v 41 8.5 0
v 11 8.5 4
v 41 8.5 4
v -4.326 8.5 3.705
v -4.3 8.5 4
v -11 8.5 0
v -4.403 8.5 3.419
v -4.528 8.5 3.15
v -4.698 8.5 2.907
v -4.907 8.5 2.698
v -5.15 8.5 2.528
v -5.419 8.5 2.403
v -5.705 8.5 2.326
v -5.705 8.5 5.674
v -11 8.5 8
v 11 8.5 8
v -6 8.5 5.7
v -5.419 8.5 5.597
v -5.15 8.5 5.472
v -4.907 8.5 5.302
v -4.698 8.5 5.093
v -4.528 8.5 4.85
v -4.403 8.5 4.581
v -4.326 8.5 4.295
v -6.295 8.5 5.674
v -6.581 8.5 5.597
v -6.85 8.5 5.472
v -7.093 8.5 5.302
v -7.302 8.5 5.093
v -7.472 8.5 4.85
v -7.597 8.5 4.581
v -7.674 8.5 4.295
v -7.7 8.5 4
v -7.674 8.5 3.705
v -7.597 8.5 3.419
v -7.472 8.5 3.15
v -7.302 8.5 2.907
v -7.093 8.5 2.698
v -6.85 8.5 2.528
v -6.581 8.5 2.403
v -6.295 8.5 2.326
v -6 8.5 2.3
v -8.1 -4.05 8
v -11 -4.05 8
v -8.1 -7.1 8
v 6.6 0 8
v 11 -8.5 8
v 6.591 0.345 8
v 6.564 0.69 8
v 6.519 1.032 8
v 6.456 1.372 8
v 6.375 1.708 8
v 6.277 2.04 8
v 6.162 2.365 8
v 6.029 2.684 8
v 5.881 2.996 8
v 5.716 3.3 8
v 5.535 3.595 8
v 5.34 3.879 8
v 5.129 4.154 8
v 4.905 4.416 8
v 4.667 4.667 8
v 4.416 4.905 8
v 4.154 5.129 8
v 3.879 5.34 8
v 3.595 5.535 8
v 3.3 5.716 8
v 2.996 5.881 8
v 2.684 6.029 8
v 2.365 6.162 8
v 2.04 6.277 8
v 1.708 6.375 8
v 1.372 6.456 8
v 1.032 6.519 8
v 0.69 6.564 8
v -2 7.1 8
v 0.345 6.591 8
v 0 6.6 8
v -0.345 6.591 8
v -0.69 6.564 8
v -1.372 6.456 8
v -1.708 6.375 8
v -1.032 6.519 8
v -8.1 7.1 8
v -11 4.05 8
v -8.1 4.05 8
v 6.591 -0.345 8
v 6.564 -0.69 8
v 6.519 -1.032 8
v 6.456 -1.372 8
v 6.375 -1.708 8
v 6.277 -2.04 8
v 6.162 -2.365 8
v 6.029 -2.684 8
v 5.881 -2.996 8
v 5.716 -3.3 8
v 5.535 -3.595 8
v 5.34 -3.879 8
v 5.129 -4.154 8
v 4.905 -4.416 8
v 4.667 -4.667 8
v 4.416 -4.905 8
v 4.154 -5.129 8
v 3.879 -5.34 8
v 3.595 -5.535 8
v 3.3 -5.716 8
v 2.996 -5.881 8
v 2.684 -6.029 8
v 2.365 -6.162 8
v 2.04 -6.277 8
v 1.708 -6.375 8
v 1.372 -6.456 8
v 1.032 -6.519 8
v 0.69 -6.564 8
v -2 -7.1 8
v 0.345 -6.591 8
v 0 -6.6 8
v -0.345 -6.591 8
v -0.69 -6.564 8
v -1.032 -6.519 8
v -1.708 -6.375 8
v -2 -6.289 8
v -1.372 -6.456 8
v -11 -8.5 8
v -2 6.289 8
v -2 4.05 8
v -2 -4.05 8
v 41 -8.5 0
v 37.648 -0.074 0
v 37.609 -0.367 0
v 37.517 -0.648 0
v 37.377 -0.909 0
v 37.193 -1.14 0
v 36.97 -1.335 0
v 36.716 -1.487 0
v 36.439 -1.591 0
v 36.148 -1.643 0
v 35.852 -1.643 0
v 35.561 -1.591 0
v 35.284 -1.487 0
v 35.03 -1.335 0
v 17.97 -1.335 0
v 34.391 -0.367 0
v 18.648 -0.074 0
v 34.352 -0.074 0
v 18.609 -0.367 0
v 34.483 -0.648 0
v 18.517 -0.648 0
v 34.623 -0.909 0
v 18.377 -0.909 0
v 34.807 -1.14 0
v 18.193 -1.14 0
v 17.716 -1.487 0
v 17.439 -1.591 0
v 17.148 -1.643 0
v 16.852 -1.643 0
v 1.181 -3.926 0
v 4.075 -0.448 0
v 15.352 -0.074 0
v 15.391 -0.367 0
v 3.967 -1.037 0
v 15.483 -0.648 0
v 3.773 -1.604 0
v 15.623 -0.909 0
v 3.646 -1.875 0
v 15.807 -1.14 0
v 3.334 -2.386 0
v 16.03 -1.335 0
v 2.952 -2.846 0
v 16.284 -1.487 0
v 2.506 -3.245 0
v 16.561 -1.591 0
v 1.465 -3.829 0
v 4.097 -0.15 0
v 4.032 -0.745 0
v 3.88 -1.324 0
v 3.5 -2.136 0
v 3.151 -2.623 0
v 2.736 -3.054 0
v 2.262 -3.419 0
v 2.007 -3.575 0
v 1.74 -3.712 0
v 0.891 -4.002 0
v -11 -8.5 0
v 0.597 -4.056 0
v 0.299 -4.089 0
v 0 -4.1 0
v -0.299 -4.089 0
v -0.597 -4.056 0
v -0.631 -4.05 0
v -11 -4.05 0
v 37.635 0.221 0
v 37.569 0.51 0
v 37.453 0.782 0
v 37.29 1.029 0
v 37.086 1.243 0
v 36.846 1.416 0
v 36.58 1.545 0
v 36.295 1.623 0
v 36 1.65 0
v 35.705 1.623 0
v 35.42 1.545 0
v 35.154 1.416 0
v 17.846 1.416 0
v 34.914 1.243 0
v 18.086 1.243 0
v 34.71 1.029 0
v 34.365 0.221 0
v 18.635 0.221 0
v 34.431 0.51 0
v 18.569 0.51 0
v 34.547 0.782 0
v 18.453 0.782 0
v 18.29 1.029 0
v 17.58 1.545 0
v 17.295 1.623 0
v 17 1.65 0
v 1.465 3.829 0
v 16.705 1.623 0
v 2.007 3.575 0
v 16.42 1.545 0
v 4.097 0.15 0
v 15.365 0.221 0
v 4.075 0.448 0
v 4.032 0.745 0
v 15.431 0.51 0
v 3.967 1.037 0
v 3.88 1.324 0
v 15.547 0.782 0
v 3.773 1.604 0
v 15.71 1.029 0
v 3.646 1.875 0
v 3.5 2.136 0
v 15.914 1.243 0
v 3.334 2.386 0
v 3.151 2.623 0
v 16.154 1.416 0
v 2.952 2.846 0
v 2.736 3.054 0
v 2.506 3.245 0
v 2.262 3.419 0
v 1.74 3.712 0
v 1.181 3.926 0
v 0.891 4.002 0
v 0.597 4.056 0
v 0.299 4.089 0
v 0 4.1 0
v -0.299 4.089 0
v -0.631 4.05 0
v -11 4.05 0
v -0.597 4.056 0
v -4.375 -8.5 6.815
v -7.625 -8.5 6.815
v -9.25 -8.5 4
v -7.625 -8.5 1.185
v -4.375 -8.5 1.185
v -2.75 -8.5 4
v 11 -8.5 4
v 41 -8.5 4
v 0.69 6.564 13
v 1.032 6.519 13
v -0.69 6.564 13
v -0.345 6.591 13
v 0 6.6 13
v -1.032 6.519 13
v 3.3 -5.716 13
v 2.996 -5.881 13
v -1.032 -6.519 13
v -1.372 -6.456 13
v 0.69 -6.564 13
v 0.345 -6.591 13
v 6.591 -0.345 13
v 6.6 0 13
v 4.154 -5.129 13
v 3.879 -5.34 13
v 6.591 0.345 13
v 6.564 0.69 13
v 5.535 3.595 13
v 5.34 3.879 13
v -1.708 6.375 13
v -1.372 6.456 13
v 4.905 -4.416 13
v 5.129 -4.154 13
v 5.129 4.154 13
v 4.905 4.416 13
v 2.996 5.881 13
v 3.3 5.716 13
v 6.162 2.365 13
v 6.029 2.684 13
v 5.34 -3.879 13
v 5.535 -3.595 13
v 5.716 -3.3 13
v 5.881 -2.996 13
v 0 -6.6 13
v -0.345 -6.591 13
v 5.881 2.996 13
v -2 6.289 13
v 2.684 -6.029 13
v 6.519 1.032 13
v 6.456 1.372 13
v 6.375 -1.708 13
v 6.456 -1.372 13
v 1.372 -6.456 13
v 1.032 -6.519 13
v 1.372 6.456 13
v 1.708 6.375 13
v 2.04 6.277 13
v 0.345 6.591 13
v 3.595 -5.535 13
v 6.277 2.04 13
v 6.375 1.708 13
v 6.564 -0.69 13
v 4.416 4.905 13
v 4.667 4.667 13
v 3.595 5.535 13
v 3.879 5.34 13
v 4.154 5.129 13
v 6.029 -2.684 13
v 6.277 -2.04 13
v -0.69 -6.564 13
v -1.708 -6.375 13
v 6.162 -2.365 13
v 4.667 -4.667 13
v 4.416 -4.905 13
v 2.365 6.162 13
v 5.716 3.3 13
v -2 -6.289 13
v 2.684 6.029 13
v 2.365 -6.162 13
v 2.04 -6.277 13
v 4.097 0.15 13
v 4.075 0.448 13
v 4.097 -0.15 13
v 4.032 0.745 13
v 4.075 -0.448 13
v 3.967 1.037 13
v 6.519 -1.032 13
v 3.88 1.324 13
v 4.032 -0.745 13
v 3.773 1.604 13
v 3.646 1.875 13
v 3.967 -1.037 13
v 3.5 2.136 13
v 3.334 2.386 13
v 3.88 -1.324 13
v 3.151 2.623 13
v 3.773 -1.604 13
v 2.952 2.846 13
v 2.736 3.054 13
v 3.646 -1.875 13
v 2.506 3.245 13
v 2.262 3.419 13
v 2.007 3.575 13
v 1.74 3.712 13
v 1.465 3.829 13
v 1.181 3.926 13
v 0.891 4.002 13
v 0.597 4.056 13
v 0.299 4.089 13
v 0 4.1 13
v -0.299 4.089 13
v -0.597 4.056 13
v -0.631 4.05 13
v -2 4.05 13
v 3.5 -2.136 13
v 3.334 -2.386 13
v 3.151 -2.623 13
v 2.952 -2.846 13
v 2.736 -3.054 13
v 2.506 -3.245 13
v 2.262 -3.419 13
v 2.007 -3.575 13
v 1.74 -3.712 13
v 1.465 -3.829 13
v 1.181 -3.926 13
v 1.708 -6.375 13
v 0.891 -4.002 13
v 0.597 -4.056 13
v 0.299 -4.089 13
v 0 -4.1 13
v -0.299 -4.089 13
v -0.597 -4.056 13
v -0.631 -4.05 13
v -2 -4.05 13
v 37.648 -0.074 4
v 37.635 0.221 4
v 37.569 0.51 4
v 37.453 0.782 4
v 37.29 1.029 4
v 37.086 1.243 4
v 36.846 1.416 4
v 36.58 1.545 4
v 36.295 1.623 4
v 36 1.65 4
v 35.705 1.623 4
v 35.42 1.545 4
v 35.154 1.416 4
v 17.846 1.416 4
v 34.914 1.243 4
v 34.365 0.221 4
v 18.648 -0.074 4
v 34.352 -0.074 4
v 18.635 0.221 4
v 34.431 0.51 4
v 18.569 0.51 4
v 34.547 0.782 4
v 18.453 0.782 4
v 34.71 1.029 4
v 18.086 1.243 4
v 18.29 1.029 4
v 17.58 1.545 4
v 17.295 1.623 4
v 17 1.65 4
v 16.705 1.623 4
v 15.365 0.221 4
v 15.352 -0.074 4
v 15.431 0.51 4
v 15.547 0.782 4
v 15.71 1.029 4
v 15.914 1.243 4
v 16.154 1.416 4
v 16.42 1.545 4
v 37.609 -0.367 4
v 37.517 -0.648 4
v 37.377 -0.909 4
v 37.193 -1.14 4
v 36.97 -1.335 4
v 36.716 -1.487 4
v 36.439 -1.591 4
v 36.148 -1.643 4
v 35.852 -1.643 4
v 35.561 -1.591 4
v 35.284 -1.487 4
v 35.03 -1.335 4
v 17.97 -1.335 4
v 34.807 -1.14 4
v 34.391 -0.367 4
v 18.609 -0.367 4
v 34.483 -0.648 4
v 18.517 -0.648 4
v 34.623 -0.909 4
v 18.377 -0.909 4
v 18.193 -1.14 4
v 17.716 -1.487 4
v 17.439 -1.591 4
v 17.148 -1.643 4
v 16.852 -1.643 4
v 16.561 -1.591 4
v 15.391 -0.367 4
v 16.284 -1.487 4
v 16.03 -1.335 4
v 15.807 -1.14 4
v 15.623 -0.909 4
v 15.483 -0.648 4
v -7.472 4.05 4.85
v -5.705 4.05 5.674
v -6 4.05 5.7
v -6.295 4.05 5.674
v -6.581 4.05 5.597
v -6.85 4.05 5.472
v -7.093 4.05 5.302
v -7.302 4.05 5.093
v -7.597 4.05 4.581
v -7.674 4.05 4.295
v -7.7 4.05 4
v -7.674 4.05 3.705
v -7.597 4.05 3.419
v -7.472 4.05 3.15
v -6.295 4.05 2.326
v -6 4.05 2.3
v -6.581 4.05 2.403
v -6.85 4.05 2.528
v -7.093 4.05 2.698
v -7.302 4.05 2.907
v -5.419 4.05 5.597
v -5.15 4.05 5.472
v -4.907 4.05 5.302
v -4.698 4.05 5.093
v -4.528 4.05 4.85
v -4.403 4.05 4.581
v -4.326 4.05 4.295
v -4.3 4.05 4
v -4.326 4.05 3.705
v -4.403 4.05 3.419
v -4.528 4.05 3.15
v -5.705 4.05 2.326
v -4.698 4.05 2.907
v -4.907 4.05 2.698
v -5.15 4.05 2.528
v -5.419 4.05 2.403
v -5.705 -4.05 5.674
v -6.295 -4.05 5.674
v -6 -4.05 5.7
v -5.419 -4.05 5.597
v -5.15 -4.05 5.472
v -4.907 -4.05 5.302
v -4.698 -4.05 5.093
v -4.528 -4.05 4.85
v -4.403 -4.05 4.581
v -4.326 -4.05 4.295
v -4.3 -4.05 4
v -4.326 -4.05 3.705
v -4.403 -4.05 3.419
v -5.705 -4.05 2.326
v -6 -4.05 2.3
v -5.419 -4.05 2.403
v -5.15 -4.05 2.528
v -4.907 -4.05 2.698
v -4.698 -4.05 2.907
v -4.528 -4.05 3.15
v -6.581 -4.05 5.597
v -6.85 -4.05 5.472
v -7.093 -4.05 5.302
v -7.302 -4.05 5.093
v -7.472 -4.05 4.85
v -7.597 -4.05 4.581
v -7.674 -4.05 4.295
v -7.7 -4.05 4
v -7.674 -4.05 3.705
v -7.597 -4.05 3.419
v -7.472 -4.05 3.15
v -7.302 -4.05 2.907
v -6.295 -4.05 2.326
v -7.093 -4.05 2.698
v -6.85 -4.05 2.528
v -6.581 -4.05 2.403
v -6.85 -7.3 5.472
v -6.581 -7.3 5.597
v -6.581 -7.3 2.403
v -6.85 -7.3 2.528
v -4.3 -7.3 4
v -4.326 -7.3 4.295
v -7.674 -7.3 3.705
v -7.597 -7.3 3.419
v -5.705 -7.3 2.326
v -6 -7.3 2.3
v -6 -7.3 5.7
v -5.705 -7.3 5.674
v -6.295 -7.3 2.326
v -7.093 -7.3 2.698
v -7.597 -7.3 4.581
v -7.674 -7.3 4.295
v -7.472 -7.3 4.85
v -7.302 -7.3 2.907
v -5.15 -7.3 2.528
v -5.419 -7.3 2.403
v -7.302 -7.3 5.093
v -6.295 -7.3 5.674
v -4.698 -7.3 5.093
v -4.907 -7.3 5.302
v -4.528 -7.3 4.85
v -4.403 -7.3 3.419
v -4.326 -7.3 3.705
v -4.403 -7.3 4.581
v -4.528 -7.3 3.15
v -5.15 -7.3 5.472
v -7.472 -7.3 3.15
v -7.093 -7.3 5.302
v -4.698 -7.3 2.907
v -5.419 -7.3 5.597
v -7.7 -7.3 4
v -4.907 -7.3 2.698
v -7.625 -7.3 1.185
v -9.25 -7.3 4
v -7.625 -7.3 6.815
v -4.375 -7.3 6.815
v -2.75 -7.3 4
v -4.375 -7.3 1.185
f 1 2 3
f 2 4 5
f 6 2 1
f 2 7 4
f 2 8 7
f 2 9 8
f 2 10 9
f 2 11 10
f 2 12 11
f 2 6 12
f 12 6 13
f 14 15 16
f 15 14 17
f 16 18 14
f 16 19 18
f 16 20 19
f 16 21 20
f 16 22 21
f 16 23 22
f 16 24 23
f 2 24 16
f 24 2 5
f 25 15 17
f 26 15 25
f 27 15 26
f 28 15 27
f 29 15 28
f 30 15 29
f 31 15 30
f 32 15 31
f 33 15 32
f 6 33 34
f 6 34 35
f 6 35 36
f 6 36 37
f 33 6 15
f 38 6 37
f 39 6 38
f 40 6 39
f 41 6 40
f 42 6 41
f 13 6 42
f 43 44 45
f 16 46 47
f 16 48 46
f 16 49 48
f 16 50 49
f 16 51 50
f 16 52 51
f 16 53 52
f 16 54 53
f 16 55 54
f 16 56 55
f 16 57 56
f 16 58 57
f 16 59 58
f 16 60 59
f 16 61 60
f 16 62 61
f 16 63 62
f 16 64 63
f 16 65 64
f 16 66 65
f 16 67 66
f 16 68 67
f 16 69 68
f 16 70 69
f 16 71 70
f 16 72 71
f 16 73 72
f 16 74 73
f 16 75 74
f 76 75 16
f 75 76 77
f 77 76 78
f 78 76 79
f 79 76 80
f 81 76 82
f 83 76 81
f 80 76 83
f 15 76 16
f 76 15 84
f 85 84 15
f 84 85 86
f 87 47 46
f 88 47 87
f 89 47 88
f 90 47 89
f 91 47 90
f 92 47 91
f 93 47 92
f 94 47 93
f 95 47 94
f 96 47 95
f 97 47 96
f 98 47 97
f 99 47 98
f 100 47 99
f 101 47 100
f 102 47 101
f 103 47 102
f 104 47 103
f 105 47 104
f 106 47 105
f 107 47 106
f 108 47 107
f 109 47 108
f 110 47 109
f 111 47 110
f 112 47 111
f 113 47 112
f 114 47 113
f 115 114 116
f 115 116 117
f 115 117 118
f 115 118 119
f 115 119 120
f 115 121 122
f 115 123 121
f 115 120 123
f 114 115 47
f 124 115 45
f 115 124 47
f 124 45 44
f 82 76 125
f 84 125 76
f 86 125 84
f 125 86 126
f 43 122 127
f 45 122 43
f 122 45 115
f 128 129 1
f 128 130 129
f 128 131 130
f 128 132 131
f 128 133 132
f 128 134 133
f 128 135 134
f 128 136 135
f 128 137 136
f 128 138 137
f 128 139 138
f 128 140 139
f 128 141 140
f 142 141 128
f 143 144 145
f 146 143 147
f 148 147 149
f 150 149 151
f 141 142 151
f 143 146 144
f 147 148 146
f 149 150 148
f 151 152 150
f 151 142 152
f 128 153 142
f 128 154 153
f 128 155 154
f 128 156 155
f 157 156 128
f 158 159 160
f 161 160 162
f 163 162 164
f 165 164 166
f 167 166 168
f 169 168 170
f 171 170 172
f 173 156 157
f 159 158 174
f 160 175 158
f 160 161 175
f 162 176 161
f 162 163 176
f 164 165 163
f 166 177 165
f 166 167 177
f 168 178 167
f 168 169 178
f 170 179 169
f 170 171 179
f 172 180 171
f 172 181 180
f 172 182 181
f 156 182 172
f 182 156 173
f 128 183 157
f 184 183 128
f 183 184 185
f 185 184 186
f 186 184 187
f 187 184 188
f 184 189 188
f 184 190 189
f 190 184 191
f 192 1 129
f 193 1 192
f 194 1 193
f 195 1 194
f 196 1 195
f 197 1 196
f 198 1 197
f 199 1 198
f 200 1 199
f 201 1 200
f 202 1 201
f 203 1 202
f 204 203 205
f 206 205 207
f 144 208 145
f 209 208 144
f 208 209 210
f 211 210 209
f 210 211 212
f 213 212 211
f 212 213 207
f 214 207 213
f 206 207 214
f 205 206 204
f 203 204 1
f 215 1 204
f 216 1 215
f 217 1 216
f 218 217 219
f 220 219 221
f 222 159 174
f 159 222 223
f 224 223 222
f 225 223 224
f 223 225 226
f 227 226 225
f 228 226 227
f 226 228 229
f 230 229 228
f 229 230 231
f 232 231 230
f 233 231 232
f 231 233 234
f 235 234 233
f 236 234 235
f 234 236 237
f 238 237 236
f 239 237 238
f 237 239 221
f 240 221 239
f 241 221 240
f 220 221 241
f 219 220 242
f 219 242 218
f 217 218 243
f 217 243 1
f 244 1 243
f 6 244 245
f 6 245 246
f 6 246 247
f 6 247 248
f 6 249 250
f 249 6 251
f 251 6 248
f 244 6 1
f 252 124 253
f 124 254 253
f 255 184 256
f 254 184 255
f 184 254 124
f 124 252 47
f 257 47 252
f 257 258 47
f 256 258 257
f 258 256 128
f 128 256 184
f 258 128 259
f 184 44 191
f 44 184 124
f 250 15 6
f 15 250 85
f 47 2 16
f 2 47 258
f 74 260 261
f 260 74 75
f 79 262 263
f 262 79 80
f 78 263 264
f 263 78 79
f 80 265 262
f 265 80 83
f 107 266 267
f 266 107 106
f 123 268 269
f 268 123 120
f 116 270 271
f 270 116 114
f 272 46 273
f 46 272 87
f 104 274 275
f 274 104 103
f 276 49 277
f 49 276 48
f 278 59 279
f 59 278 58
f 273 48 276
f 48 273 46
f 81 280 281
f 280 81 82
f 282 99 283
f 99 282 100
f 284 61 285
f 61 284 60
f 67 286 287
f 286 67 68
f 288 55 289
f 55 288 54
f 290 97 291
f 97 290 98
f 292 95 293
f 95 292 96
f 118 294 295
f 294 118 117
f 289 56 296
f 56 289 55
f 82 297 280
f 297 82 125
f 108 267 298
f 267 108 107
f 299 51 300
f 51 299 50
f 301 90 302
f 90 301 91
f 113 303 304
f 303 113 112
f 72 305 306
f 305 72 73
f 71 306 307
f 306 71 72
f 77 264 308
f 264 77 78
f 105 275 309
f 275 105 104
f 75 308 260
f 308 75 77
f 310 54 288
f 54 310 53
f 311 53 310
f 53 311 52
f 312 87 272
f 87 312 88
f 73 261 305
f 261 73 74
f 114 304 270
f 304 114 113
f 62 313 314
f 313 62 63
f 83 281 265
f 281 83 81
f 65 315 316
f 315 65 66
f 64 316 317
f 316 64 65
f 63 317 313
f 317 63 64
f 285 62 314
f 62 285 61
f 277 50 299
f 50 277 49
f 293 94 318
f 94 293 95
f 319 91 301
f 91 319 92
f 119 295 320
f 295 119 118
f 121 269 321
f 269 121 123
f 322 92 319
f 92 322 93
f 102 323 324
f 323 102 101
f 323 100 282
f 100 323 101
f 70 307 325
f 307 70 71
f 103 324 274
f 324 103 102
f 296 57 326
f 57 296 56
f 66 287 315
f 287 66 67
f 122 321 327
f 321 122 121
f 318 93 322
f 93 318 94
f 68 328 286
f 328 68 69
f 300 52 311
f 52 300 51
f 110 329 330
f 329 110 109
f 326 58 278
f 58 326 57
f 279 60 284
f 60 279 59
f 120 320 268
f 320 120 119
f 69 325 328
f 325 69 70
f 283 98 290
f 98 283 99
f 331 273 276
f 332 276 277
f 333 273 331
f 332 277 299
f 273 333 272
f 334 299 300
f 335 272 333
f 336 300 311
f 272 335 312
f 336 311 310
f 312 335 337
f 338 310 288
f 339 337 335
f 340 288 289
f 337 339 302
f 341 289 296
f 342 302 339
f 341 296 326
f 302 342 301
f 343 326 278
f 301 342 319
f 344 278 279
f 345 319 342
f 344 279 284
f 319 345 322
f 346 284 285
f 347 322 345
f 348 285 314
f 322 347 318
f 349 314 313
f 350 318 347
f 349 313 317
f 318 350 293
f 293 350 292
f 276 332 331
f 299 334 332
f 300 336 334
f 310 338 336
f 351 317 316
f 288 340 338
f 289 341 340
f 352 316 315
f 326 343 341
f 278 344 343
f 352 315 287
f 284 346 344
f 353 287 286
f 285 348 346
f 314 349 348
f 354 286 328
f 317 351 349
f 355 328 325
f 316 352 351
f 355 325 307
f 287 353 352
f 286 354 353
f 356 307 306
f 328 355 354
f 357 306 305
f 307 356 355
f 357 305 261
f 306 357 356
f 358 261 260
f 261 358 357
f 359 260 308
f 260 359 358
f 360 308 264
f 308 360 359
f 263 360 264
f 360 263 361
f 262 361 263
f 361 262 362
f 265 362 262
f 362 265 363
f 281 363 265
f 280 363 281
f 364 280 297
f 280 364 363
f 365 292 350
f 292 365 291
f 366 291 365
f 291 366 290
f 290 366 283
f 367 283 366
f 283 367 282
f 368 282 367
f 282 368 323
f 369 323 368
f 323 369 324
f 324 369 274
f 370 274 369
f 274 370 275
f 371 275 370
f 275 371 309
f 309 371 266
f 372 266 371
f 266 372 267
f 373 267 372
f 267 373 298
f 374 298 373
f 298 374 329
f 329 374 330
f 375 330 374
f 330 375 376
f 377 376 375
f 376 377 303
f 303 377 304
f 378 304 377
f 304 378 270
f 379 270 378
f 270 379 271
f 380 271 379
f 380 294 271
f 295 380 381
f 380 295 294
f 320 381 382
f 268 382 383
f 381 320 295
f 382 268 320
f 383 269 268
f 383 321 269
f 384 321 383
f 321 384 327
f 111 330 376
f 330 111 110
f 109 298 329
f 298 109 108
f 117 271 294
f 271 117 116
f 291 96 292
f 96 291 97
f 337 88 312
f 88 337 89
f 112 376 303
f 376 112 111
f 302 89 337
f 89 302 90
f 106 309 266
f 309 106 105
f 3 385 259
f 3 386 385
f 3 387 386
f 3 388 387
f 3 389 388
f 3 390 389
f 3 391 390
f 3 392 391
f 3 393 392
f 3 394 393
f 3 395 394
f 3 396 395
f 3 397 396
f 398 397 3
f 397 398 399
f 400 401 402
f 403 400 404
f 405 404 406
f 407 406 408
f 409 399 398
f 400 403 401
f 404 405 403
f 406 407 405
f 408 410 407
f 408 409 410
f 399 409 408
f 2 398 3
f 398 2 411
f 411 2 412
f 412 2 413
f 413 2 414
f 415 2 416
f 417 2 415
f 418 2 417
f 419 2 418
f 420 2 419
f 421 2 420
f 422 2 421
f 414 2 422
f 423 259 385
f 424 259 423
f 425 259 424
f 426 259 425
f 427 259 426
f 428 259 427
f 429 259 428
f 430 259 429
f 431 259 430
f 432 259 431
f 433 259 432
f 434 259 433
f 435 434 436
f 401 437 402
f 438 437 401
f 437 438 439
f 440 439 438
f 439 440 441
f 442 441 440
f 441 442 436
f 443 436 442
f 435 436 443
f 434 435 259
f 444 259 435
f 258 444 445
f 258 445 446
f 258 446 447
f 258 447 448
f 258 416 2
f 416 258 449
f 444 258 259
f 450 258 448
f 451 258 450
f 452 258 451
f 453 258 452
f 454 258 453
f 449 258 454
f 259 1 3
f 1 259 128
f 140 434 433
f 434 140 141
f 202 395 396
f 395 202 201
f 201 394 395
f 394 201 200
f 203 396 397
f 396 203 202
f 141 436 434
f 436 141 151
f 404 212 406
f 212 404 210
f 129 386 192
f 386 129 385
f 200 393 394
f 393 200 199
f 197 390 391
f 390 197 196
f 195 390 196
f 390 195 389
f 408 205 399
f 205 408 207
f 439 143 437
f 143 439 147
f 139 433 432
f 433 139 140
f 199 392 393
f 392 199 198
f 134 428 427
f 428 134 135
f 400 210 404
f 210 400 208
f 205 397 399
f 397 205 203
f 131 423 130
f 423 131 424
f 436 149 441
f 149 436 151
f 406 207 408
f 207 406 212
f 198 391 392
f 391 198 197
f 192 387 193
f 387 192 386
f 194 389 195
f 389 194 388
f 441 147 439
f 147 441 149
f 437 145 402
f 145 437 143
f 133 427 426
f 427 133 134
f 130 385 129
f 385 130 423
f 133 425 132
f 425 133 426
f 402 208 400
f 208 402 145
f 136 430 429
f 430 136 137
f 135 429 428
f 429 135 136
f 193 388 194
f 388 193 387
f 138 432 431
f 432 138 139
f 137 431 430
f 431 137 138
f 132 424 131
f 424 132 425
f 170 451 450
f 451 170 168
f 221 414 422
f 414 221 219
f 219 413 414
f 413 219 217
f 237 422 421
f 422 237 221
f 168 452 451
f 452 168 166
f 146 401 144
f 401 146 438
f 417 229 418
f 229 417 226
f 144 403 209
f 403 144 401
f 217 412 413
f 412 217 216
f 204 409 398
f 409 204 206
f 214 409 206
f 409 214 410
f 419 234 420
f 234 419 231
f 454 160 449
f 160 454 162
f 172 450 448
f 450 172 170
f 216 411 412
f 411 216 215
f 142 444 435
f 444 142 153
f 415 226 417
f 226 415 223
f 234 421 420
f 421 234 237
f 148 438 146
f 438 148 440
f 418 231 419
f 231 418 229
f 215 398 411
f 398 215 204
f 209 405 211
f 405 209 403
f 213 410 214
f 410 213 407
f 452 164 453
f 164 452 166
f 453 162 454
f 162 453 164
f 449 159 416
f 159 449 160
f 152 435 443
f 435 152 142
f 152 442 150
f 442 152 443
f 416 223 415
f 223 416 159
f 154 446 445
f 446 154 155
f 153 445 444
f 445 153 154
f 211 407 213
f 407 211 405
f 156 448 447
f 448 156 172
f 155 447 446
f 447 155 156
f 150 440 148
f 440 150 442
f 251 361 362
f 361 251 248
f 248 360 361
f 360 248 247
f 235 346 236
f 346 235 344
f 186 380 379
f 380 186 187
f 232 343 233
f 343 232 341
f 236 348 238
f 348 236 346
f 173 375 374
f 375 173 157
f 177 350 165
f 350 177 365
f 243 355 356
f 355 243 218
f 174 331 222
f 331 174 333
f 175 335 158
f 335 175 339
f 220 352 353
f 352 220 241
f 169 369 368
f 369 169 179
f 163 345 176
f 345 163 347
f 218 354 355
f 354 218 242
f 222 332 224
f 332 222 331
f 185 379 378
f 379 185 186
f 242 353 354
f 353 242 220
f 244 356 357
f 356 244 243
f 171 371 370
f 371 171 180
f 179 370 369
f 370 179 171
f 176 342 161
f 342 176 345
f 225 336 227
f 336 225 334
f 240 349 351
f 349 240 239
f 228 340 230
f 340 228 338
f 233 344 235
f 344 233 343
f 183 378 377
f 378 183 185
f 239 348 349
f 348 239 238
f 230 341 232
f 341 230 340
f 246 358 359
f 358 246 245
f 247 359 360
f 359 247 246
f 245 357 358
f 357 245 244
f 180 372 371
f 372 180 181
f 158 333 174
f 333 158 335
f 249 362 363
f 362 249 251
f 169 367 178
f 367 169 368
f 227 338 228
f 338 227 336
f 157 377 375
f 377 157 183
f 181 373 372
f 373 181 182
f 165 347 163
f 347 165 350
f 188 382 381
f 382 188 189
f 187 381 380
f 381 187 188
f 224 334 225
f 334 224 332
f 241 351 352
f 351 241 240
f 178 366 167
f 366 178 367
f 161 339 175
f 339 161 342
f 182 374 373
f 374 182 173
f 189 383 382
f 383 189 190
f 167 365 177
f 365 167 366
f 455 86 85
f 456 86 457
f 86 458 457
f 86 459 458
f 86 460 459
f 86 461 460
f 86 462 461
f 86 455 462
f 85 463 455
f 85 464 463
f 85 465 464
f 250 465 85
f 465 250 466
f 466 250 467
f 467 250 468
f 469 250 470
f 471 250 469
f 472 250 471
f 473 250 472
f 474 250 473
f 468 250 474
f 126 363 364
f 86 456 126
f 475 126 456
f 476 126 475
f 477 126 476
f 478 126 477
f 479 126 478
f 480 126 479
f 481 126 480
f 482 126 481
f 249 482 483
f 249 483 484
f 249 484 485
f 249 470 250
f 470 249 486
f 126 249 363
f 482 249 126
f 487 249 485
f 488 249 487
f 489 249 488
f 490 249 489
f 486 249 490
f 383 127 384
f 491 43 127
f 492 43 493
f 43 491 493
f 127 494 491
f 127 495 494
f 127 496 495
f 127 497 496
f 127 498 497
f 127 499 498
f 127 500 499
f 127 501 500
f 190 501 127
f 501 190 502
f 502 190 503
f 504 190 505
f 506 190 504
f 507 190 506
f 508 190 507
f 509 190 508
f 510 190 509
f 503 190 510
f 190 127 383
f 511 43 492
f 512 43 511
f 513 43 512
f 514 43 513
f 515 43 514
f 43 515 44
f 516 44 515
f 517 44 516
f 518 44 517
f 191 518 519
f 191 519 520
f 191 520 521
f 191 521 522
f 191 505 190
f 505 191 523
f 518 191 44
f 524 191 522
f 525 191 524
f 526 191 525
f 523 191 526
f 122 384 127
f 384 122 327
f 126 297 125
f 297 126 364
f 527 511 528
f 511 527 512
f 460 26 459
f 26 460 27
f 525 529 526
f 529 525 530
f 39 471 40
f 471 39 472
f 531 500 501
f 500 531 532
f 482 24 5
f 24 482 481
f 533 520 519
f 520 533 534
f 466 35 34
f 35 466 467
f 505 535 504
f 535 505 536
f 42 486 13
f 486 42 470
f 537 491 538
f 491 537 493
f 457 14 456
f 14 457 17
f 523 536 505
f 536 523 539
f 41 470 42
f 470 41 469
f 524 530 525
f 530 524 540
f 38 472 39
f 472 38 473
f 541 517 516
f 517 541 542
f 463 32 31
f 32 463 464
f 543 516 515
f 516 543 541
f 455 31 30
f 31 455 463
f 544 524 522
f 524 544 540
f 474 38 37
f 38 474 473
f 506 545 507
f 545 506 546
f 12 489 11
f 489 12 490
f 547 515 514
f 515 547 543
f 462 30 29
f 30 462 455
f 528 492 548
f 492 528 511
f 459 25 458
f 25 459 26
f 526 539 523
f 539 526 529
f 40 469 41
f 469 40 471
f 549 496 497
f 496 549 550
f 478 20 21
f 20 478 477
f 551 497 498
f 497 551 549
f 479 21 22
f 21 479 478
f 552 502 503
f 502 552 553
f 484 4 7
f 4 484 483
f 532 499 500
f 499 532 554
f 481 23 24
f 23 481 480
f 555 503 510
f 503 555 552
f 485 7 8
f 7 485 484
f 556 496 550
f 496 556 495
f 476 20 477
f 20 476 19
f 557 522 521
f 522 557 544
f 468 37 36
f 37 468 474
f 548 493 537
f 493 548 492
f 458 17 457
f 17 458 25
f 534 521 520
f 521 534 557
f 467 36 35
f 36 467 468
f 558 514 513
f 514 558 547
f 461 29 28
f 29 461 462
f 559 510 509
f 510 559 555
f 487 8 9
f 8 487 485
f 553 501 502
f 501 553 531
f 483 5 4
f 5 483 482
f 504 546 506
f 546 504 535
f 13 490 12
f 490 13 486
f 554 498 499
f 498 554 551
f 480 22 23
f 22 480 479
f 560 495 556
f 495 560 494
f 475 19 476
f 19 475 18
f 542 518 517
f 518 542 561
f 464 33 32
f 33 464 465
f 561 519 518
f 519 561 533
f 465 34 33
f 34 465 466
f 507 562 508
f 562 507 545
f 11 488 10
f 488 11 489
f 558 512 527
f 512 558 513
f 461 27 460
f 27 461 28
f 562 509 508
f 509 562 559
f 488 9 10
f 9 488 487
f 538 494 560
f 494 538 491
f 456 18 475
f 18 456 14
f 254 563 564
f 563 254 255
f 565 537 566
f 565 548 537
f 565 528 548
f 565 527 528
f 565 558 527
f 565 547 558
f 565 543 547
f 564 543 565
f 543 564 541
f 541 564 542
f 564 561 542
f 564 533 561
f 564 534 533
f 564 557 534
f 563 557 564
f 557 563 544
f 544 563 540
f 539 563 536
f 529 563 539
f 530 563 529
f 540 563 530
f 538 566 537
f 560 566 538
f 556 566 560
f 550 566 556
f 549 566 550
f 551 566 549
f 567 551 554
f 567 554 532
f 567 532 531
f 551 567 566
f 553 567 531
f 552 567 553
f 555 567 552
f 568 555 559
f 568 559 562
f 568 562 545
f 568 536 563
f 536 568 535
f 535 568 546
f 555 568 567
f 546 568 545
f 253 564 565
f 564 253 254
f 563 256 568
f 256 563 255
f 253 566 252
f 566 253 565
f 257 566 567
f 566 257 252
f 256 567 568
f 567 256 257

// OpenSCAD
// file: configuration.scad
LMxUU = 8;				// Choose linear bearing: 8 or 12mm
rodspacing = 175;		// Distance between rods:	175 standard, 190 wide
PVC_pipe_OD = 32;		// Default 32mm
PVC_pipe_ID = 26;	// measure pipe ID to adjust
Drive_pipe_OD = 22;	// Drive pipe outter diameter: 22mm default
THREADLESS = true;	// True for use of threadless ball screw in z-bracket
SUPPORTED_ROD = true;	// Rods held by Z-mounts - False for platform mounted (lasercut)
Leadnut_thread = false;// Apply the thread of the leadscrew nut to the Z coupler

ENVELOPE_CHECK = false;

m3_dia = 3.3;
m3_nut_dia = 6.8;
m3_nut_slot = 5.8;
m3_nut_height = 3;

m4_dia = 4.3;
m4_nut_dia = 9;
m4_nut_height = 4;

m8_dia = 8.2;
m8_nut_dia = 18;
m8_nut_height = 8;

print_layer_height = 0.25;
// main file
include <configuration.scad>



module limitSwitchHolder(height=8) {
    width = 17;
    length=22;

    support_height=5;
    tol=0.1;
  rotate([0,0,90])
  difference() {
    union() {
      translate([-width/2,-length/2,0]) cube(size=[width,length,height]);
      // support
      translate([0,0,0]) cylinder(r=6.5+tol,h=height+support_height);
        // plate
        color([1,0,0,1])translate([-width/2,-length/2-30,0])cube([width,30,4]);
    }   
    // screw holes
    translate([0,-length/2-30+5,0])cylinder(d=m3_dia, h=4);
    translate([0,-length/2-30+24,0])cylinder(d=m3_dia, h=4);
    // rod hole
    cylinder(r=4+tol,h=height+support_height+2*tol);
    
    // klem gat
    translate([(-8-tol)/2,0,0-tol]) cube(size=[8+tol,length+tol,height+support_height + 2*tol]);

    // weggommen halve cirkel geleidingsbus
    translate([(-7-tol),2,height]) cube(size=[14+2*tol,12/2+tol,support_height+2*tol]);
//    translate([-10,6,1]) rotate([-30,0,0]) cube(size=[20,10,support_height]);
    
   // schroefgat
    translate([-width/2-tol,6,height/2]) rotate([0,90,0]) cylinder(r=1.5+tol*2,h=width+2*tol);
    translate([-width/2-tol,6,height/2]) rotate([0,90,0]) rotate([0,0,30]) cylinder($fn=6,r=3.25,h=1.3);
  }
}

$fs=0.3;
$fa=3;
limitSwitchHolder();
